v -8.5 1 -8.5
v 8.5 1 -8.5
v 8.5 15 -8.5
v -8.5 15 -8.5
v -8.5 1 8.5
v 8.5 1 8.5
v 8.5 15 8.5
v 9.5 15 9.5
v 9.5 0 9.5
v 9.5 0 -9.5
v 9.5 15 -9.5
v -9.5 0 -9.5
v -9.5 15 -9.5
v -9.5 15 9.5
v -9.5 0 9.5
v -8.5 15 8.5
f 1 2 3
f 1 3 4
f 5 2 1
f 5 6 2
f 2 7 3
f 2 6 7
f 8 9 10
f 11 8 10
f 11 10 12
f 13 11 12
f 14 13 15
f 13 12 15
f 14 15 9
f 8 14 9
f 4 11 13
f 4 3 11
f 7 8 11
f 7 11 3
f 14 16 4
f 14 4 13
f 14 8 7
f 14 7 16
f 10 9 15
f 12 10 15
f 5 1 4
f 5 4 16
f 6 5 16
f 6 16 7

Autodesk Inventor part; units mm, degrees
ref_plane "YZ Plane" through (0, 0, 0) normal (1, 0, 0) x (0, 1, 0)
ref_plane "XZ Plane" through (0, 0, 0) normal (0, 1, 0) x (-1, 0, 0)
ref_plane "XY Plane" through (0, 0, 0) normal (0, 0, 1) x (1, 0, 0)
sketch "Boceto1" plane through (0, 0, 0) normal (0, 1, 0) x (-1, 0, 0)
  line L0 (8.5, 8.5) -> (-8.5, 8.5)
  line L1 (-8.5, 8.5) -> (-8.5, -8.5)
  line L2 (-8.5, -8.5) -> (8.5, -8.5)
  line L3 (8.5, -8.5) -> (8.5, 8.5)
  line L4 (9.5, 9.5) -> (-9.5, 9.5)
  line L5 (-9.5, 9.5) -> (-9.5, -9.5)
  line L6 (-9.5, -9.5) -> (9.5, -9.5)
  line L7 (9.5, -9.5) -> (9.5, 9.5)
  point P0 (0, 0)
  point P1 (8.5, 0)
  point P2 (0, -8.5)
  dimension "d0" = 17
  dimension "d1" = 17
  dimension "d2" = 1
  dimension "d3" = 1
  dimension "d4" = 1
  dimension "d5" = 1
extrude "Extrusión1" add sketch "Boceto1" along normal blind 15
extrude "Extrusión2" add sketch "Boceto1" along normal blind 1 contours L3 L2 L1 L0
properties part number "cubo"
